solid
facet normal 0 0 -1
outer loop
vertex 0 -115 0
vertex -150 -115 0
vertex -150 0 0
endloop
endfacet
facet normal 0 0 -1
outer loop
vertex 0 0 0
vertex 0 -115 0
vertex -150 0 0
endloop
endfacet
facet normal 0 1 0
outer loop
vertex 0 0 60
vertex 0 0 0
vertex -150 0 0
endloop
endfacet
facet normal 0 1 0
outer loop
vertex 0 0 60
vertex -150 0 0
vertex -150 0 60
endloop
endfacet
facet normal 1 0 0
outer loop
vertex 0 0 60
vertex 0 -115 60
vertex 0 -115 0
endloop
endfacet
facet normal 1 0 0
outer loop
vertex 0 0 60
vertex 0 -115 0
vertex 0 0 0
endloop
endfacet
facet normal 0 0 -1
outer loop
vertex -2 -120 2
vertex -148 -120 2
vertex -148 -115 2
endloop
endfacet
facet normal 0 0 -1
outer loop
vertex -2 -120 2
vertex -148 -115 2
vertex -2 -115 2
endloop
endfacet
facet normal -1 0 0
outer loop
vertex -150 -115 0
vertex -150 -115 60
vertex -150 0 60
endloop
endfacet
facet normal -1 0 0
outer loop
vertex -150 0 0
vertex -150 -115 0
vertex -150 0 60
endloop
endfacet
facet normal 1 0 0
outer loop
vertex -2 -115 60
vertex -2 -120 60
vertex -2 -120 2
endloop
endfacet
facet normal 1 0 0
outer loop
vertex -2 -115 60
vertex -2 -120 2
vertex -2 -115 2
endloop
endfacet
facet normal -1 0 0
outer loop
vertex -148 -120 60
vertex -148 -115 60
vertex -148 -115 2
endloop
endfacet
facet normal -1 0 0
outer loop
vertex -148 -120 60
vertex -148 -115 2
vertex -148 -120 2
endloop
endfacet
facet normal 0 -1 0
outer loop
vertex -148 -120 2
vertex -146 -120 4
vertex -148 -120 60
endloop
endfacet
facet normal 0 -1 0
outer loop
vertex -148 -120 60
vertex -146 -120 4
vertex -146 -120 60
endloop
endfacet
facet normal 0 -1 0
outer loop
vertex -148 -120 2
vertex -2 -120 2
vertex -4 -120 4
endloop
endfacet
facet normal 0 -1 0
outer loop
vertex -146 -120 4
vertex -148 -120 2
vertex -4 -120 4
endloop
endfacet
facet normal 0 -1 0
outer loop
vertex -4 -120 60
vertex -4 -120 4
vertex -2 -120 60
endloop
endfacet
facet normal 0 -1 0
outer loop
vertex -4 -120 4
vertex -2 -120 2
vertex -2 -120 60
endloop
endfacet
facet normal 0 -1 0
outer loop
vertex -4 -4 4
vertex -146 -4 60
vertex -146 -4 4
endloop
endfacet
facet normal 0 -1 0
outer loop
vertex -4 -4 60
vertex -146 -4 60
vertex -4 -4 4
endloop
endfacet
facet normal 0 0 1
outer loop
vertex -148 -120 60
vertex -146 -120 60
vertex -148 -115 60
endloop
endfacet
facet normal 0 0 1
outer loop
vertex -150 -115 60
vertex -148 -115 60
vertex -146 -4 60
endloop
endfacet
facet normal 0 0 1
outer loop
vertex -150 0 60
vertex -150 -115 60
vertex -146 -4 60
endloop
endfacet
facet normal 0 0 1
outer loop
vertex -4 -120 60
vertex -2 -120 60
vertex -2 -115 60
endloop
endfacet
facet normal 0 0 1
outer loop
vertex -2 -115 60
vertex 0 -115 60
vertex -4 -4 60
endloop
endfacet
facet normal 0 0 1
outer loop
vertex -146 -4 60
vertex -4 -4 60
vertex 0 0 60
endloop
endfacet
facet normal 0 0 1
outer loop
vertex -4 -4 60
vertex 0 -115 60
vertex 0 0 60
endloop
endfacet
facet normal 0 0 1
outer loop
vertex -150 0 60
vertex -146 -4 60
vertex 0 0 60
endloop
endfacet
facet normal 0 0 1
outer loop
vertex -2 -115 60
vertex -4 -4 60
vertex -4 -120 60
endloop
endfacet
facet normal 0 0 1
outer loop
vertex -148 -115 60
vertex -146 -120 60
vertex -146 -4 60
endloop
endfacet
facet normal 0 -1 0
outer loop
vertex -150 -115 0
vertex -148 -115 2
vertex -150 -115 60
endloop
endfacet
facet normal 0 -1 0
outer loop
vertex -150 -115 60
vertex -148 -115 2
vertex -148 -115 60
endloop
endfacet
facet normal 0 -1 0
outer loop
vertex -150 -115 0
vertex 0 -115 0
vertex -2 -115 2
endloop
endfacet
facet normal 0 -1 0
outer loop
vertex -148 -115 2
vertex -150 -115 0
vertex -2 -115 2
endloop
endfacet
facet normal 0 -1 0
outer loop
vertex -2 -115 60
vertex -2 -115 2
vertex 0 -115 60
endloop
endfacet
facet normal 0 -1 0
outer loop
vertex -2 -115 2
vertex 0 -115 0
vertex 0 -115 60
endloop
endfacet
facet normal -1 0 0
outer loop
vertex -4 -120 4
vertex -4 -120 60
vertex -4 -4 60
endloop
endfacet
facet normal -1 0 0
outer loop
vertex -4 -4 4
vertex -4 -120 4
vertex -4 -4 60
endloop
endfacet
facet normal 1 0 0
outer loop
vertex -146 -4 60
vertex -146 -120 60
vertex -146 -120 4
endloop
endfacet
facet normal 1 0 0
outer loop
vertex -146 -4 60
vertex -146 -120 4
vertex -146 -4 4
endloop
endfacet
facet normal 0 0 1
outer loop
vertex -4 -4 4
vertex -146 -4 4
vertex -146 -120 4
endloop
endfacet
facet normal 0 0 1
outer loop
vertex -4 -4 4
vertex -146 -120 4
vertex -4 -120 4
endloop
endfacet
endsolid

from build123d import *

# Parameters (mm, degrees)
F0_W     = 120
F0_H     = 60
F1_DEPTH = 150
F2_W     = 142
F2_H     = 116
F3_DEPTH = 56
F4_W     = 5
F4_H     = 60
F5_DEPTH = 2
F6_W     = 5
F6_H     = 60
F7_DEPTH = 2
F8_W     = 146
F8_H     = 5
F9_DEPTH = 2


with BuildPart() as f1:
    # F0 (on Right) → F1 (new body)
    with BuildSketch(Plane.YZ):
        with Locations((-60, 30)):
            Rectangle(F0_W, F0_H)
    extrude(amount=-F1_DEPTH)

    # F2 (on face) → F3 (cut)
    with BuildSketch(Plane.XY.offset(60)):
        with Locations((-75, -62)):
            Rectangle(F2_W, F2_H)
    extrude(amount=-F3_DEPTH, mode=Mode.SUBTRACT)

    # F4 (on face) → F5 (cut)
    with BuildSketch(Plane(origin=(-150, 0, 0), x_dir=(0, -1, 0), z_dir=(-1, 0, 0))):
        with Locations((117.5, 30)):
            Rectangle(F4_W, F4_H)
    extrude(amount=-F5_DEPTH, mode=Mode.SUBTRACT)

    # F6 (on face) → F7 (cut)
    with BuildSketch(Plane.YZ):
        with Locations((-117.5, 30)):
            Rectangle(F6_W, F6_H)
    extrude(amount=-F7_DEPTH, mode=Mode.SUBTRACT)

    # F8 (on face) → F9 (cut)
    with BuildSketch(Plane(origin=(0, 0, 0), x_dir=(1, 0, 0), z_dir=(0, 0, -1))):
        with Locations((-75, 117.5)):
            Rectangle(F8_W, F8_H)
    extrude(amount=-F9_DEPTH, mode=Mode.SUBTRACT)


solid = f1.part
